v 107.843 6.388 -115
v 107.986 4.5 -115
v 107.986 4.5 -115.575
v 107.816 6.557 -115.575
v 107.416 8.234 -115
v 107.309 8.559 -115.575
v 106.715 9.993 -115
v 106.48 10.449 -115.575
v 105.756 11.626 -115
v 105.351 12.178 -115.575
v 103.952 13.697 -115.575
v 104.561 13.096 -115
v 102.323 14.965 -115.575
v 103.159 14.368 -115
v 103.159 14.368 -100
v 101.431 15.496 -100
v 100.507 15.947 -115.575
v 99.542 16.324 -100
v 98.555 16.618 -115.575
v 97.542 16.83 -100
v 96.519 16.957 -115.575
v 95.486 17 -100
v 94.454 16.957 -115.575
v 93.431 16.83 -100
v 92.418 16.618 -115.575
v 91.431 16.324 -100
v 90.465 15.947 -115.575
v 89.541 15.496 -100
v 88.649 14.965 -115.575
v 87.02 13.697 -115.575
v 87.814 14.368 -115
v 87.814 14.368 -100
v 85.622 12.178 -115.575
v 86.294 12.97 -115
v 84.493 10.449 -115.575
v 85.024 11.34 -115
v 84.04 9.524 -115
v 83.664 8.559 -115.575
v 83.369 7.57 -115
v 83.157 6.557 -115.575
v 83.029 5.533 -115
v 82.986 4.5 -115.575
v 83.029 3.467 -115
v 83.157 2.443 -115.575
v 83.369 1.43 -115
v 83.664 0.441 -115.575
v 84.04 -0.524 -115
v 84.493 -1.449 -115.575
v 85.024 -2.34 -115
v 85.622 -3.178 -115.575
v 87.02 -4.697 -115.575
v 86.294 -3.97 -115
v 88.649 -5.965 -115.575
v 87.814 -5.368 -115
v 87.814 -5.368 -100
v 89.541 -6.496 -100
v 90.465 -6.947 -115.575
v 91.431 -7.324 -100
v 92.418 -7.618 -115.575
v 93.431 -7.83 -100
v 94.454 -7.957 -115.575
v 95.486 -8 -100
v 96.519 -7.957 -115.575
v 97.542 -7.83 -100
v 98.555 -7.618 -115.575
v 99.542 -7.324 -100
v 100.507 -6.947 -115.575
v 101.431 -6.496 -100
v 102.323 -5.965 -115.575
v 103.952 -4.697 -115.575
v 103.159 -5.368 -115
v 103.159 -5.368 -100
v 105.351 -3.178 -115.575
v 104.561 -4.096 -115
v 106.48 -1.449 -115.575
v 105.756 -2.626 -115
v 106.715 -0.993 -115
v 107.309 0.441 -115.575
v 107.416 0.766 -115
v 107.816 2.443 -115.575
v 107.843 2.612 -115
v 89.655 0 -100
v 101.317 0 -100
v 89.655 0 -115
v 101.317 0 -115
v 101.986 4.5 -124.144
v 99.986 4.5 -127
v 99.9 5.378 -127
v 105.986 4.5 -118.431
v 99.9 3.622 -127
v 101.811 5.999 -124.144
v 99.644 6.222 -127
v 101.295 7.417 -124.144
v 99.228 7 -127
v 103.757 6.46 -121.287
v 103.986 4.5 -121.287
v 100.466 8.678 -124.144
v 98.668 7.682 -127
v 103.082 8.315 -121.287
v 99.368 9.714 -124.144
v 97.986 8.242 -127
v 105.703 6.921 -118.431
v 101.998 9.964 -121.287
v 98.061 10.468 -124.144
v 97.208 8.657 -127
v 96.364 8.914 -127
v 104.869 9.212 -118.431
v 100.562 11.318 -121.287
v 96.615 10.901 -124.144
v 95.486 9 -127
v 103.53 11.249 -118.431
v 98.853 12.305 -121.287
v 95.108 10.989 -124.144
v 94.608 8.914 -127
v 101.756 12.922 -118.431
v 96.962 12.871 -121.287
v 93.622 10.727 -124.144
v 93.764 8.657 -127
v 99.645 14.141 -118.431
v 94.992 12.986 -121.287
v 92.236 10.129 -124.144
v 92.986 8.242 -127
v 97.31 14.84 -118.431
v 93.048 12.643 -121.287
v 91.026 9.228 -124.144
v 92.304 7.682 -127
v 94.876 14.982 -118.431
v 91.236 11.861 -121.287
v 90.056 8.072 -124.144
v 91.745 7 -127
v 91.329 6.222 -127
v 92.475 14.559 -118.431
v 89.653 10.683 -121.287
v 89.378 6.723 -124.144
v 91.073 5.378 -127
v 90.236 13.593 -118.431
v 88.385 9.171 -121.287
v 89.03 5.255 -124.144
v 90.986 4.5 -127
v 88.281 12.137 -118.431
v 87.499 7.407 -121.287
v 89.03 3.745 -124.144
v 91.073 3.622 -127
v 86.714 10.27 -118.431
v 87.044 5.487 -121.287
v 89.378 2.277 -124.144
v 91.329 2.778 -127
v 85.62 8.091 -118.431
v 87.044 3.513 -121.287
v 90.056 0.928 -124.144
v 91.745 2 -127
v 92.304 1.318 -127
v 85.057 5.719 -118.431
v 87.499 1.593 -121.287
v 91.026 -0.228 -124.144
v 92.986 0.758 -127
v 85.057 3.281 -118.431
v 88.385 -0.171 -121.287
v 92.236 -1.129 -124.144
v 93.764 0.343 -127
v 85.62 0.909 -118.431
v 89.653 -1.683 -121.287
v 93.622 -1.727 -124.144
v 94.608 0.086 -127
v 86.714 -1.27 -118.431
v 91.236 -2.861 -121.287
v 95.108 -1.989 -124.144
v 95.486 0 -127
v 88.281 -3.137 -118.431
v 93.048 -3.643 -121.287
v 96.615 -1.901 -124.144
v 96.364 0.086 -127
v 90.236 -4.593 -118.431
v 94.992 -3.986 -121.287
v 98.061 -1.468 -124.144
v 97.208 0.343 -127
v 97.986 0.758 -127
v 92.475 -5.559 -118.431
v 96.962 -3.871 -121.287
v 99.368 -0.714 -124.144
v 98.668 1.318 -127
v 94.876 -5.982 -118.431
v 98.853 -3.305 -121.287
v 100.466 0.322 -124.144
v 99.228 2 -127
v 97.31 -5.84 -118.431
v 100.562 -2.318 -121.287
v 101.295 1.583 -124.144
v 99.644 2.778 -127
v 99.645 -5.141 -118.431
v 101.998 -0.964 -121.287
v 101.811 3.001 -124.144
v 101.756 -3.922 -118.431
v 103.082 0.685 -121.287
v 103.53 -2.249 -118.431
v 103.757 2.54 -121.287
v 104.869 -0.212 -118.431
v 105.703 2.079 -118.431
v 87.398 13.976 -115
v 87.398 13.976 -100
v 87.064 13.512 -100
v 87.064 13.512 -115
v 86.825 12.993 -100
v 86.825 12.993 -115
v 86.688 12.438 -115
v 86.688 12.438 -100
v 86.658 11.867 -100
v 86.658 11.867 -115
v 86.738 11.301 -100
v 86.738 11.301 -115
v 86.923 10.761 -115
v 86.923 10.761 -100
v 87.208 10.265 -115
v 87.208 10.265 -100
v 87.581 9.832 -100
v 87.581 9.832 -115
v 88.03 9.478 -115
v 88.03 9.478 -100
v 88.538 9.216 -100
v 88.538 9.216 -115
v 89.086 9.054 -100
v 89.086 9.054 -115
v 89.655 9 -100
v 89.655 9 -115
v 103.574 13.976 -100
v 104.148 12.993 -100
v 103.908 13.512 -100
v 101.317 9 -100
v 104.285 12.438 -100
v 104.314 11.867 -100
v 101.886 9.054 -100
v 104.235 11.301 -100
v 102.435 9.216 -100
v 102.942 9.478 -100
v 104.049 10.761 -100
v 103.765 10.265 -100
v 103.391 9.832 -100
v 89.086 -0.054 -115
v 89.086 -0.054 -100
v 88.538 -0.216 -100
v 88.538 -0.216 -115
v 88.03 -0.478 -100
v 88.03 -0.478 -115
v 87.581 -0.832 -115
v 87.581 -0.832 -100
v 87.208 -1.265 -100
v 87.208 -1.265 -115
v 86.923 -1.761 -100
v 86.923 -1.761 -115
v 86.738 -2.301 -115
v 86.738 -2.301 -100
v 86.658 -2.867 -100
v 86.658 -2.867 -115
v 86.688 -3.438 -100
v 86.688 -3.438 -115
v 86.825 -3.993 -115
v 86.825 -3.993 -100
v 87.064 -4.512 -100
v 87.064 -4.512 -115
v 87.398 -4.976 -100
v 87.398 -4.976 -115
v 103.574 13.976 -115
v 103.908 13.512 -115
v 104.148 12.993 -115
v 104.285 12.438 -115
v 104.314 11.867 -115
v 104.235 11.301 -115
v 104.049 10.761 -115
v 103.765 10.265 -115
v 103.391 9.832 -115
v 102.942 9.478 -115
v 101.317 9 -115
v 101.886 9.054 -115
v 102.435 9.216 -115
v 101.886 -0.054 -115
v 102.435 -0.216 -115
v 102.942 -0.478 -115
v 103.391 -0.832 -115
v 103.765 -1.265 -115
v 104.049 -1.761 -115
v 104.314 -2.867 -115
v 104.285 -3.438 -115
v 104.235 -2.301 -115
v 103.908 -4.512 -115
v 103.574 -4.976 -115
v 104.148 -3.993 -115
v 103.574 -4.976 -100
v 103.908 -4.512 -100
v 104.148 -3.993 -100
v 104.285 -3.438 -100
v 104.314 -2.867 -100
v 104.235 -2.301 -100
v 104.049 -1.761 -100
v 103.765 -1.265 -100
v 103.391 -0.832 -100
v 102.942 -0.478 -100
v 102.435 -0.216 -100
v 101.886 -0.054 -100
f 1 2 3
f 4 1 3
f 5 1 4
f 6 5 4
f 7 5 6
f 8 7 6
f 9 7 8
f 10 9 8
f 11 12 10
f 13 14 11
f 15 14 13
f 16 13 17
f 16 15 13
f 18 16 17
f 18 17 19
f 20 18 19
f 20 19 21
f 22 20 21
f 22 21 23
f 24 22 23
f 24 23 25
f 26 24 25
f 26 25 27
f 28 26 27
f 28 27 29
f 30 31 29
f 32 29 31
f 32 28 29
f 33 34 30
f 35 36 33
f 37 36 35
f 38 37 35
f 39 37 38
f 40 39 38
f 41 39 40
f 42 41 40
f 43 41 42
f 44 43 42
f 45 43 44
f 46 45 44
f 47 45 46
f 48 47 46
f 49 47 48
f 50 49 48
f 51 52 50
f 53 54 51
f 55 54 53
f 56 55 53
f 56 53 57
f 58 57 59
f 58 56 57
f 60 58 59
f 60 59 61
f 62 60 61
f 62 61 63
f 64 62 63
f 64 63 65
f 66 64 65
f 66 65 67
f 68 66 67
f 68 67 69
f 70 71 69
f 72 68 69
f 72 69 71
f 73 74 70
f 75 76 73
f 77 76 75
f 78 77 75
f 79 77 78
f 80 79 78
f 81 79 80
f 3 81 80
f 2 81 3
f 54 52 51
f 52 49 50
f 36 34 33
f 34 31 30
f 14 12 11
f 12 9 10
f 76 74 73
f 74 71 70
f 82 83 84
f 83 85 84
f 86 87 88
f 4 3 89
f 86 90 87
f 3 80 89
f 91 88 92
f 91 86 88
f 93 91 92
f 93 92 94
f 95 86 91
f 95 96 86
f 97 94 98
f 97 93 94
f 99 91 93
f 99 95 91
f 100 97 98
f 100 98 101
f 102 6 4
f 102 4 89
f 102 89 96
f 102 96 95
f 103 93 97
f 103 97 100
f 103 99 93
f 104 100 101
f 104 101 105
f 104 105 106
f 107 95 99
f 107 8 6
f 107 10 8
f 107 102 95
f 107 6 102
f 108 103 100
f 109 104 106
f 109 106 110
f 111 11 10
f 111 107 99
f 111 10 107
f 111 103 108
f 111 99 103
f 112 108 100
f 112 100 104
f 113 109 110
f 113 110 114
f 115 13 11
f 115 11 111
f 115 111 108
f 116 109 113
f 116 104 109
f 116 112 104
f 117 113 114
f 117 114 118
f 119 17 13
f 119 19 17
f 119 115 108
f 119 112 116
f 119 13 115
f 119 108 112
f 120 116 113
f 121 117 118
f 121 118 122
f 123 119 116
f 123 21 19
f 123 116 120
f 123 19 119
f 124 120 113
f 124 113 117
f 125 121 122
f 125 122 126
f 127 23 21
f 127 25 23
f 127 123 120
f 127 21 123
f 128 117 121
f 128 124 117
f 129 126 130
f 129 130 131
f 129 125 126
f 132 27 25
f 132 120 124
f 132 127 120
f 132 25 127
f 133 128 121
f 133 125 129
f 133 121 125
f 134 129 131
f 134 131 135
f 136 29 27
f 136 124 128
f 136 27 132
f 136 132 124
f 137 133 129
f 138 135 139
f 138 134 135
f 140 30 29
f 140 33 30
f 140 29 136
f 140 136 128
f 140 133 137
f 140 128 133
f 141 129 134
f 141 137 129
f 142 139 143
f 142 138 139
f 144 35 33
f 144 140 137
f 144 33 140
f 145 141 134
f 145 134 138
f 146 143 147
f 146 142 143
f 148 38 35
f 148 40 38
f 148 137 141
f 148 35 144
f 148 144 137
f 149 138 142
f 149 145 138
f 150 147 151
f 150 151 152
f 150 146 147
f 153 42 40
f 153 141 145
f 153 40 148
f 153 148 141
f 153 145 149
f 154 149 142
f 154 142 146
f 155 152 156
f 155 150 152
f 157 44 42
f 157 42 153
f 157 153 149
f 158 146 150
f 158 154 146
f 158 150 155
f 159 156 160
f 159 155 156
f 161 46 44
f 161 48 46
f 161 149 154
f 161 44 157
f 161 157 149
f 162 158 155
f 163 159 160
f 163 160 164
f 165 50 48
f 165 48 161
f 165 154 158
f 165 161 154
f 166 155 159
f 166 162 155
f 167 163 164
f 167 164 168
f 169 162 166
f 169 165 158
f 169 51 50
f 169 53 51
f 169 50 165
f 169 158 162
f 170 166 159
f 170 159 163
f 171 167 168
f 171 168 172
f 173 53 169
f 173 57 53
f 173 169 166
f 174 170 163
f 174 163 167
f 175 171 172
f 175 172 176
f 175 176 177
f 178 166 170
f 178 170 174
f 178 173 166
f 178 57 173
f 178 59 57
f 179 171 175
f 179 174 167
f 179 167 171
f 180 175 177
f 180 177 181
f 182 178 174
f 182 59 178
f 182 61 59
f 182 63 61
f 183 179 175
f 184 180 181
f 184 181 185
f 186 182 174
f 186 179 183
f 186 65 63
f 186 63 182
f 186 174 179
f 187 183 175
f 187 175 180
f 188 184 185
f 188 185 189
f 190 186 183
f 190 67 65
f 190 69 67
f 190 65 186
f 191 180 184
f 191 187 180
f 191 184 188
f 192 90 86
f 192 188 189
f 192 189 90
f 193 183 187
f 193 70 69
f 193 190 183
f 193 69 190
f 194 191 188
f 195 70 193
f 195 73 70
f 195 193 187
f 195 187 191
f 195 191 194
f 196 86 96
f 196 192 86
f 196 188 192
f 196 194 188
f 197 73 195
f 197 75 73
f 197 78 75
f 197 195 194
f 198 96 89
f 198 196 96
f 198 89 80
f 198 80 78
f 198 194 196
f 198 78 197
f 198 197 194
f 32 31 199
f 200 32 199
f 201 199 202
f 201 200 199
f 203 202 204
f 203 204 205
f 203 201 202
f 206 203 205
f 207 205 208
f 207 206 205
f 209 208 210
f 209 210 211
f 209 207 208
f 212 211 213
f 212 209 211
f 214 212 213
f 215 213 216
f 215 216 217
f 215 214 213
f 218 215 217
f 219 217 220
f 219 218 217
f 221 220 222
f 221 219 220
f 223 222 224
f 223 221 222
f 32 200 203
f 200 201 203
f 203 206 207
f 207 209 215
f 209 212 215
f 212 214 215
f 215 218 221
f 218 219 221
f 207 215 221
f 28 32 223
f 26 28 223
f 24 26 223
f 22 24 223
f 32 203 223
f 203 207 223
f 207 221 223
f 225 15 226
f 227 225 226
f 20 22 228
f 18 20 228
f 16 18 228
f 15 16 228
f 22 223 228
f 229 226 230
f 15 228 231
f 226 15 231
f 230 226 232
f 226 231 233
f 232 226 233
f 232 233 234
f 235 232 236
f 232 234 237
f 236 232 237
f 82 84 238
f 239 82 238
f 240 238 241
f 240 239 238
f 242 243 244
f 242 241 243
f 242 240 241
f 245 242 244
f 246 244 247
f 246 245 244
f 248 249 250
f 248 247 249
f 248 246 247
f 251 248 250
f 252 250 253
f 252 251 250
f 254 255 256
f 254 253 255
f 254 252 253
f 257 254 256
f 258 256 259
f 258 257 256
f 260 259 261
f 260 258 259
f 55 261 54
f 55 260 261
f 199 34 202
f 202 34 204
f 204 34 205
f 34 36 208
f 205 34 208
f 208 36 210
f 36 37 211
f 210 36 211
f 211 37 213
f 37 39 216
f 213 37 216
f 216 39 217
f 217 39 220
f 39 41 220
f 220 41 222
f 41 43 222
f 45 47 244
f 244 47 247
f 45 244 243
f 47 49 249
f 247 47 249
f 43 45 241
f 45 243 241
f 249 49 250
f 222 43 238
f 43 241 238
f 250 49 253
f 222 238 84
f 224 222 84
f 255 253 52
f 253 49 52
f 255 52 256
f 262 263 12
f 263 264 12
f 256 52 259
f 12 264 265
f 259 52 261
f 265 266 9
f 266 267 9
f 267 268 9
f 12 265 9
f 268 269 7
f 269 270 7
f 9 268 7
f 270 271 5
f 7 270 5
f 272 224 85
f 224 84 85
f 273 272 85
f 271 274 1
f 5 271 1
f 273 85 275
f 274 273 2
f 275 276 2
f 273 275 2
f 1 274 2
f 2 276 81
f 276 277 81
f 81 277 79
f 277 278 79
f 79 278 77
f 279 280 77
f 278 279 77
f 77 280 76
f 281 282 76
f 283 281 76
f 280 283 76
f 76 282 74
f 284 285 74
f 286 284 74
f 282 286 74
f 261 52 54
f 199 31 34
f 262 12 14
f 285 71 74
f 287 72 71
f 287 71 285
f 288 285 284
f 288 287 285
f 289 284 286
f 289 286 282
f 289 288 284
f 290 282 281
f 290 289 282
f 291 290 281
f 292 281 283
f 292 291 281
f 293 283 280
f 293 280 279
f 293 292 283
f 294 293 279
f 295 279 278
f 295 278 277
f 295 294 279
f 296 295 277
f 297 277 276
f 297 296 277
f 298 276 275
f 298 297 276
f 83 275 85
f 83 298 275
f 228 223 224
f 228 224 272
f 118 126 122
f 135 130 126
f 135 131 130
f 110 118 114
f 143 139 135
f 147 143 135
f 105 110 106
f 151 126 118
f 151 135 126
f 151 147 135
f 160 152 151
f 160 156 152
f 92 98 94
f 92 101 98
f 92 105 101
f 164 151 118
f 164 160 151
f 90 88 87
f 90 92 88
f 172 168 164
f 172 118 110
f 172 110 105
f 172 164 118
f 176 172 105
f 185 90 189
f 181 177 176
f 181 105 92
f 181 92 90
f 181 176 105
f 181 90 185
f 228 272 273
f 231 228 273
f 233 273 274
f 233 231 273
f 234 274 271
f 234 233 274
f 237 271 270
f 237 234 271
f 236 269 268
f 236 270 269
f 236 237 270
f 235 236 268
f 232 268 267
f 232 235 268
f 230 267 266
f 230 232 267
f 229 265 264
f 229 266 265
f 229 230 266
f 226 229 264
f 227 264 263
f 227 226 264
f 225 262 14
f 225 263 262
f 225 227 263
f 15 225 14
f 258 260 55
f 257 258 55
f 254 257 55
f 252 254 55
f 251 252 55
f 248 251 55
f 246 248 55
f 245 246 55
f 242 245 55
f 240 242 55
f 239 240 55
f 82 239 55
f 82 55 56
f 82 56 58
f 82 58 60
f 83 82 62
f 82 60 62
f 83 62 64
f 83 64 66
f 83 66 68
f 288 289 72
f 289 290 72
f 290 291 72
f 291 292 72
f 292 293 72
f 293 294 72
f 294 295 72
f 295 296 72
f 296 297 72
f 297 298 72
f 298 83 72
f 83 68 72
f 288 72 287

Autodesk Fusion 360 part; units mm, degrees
sketch "Sketch1" plane through (0, 0, -115) normal (0, 0, -1) x (1, 0, 0) in component "Component"
  line L0 (138.8604, -9) -> (138.8604, 0)
  line L1 (138.8604, 0) -> (-138.8604, 0)
  line L2 (-138.8604, 0) -> (-138.8604, -9)
  line L3 (-138.8604, -9) -> (138.8604, -9)
  circle A0 centre (95.4863, -4.5) radius 12.5
  dimension "d1" = 25
extrude "Extrude1" add sketch "Sketch1" along normal blind 12 contours L3 A0 | L1 L3 A0 | L1 A0 in component "Component"
chamfer "Chamfer1" distance 8 angle 55 1 edges at (83.8322, 9.0202, -127) measured on face at (91.6434, 3.879, -127) in component "Component"
extrude "Extrude2" add sketch "Sketch1" against normal blind 15 contours L3 A0 | L1 A0 in component "Component"
fillet "Fillet1" radius 3 4 edges at (83.8244, 9, -107.5) (83.8244, 0, -107.5) (107.1482, 0, -107.5) (107.1482, 9, -107.5) in component "Component"
component "Component" placed x (1, 0, 0) y (0, 1, 0) z (0, 0, 1) at (0, 0, 0)
